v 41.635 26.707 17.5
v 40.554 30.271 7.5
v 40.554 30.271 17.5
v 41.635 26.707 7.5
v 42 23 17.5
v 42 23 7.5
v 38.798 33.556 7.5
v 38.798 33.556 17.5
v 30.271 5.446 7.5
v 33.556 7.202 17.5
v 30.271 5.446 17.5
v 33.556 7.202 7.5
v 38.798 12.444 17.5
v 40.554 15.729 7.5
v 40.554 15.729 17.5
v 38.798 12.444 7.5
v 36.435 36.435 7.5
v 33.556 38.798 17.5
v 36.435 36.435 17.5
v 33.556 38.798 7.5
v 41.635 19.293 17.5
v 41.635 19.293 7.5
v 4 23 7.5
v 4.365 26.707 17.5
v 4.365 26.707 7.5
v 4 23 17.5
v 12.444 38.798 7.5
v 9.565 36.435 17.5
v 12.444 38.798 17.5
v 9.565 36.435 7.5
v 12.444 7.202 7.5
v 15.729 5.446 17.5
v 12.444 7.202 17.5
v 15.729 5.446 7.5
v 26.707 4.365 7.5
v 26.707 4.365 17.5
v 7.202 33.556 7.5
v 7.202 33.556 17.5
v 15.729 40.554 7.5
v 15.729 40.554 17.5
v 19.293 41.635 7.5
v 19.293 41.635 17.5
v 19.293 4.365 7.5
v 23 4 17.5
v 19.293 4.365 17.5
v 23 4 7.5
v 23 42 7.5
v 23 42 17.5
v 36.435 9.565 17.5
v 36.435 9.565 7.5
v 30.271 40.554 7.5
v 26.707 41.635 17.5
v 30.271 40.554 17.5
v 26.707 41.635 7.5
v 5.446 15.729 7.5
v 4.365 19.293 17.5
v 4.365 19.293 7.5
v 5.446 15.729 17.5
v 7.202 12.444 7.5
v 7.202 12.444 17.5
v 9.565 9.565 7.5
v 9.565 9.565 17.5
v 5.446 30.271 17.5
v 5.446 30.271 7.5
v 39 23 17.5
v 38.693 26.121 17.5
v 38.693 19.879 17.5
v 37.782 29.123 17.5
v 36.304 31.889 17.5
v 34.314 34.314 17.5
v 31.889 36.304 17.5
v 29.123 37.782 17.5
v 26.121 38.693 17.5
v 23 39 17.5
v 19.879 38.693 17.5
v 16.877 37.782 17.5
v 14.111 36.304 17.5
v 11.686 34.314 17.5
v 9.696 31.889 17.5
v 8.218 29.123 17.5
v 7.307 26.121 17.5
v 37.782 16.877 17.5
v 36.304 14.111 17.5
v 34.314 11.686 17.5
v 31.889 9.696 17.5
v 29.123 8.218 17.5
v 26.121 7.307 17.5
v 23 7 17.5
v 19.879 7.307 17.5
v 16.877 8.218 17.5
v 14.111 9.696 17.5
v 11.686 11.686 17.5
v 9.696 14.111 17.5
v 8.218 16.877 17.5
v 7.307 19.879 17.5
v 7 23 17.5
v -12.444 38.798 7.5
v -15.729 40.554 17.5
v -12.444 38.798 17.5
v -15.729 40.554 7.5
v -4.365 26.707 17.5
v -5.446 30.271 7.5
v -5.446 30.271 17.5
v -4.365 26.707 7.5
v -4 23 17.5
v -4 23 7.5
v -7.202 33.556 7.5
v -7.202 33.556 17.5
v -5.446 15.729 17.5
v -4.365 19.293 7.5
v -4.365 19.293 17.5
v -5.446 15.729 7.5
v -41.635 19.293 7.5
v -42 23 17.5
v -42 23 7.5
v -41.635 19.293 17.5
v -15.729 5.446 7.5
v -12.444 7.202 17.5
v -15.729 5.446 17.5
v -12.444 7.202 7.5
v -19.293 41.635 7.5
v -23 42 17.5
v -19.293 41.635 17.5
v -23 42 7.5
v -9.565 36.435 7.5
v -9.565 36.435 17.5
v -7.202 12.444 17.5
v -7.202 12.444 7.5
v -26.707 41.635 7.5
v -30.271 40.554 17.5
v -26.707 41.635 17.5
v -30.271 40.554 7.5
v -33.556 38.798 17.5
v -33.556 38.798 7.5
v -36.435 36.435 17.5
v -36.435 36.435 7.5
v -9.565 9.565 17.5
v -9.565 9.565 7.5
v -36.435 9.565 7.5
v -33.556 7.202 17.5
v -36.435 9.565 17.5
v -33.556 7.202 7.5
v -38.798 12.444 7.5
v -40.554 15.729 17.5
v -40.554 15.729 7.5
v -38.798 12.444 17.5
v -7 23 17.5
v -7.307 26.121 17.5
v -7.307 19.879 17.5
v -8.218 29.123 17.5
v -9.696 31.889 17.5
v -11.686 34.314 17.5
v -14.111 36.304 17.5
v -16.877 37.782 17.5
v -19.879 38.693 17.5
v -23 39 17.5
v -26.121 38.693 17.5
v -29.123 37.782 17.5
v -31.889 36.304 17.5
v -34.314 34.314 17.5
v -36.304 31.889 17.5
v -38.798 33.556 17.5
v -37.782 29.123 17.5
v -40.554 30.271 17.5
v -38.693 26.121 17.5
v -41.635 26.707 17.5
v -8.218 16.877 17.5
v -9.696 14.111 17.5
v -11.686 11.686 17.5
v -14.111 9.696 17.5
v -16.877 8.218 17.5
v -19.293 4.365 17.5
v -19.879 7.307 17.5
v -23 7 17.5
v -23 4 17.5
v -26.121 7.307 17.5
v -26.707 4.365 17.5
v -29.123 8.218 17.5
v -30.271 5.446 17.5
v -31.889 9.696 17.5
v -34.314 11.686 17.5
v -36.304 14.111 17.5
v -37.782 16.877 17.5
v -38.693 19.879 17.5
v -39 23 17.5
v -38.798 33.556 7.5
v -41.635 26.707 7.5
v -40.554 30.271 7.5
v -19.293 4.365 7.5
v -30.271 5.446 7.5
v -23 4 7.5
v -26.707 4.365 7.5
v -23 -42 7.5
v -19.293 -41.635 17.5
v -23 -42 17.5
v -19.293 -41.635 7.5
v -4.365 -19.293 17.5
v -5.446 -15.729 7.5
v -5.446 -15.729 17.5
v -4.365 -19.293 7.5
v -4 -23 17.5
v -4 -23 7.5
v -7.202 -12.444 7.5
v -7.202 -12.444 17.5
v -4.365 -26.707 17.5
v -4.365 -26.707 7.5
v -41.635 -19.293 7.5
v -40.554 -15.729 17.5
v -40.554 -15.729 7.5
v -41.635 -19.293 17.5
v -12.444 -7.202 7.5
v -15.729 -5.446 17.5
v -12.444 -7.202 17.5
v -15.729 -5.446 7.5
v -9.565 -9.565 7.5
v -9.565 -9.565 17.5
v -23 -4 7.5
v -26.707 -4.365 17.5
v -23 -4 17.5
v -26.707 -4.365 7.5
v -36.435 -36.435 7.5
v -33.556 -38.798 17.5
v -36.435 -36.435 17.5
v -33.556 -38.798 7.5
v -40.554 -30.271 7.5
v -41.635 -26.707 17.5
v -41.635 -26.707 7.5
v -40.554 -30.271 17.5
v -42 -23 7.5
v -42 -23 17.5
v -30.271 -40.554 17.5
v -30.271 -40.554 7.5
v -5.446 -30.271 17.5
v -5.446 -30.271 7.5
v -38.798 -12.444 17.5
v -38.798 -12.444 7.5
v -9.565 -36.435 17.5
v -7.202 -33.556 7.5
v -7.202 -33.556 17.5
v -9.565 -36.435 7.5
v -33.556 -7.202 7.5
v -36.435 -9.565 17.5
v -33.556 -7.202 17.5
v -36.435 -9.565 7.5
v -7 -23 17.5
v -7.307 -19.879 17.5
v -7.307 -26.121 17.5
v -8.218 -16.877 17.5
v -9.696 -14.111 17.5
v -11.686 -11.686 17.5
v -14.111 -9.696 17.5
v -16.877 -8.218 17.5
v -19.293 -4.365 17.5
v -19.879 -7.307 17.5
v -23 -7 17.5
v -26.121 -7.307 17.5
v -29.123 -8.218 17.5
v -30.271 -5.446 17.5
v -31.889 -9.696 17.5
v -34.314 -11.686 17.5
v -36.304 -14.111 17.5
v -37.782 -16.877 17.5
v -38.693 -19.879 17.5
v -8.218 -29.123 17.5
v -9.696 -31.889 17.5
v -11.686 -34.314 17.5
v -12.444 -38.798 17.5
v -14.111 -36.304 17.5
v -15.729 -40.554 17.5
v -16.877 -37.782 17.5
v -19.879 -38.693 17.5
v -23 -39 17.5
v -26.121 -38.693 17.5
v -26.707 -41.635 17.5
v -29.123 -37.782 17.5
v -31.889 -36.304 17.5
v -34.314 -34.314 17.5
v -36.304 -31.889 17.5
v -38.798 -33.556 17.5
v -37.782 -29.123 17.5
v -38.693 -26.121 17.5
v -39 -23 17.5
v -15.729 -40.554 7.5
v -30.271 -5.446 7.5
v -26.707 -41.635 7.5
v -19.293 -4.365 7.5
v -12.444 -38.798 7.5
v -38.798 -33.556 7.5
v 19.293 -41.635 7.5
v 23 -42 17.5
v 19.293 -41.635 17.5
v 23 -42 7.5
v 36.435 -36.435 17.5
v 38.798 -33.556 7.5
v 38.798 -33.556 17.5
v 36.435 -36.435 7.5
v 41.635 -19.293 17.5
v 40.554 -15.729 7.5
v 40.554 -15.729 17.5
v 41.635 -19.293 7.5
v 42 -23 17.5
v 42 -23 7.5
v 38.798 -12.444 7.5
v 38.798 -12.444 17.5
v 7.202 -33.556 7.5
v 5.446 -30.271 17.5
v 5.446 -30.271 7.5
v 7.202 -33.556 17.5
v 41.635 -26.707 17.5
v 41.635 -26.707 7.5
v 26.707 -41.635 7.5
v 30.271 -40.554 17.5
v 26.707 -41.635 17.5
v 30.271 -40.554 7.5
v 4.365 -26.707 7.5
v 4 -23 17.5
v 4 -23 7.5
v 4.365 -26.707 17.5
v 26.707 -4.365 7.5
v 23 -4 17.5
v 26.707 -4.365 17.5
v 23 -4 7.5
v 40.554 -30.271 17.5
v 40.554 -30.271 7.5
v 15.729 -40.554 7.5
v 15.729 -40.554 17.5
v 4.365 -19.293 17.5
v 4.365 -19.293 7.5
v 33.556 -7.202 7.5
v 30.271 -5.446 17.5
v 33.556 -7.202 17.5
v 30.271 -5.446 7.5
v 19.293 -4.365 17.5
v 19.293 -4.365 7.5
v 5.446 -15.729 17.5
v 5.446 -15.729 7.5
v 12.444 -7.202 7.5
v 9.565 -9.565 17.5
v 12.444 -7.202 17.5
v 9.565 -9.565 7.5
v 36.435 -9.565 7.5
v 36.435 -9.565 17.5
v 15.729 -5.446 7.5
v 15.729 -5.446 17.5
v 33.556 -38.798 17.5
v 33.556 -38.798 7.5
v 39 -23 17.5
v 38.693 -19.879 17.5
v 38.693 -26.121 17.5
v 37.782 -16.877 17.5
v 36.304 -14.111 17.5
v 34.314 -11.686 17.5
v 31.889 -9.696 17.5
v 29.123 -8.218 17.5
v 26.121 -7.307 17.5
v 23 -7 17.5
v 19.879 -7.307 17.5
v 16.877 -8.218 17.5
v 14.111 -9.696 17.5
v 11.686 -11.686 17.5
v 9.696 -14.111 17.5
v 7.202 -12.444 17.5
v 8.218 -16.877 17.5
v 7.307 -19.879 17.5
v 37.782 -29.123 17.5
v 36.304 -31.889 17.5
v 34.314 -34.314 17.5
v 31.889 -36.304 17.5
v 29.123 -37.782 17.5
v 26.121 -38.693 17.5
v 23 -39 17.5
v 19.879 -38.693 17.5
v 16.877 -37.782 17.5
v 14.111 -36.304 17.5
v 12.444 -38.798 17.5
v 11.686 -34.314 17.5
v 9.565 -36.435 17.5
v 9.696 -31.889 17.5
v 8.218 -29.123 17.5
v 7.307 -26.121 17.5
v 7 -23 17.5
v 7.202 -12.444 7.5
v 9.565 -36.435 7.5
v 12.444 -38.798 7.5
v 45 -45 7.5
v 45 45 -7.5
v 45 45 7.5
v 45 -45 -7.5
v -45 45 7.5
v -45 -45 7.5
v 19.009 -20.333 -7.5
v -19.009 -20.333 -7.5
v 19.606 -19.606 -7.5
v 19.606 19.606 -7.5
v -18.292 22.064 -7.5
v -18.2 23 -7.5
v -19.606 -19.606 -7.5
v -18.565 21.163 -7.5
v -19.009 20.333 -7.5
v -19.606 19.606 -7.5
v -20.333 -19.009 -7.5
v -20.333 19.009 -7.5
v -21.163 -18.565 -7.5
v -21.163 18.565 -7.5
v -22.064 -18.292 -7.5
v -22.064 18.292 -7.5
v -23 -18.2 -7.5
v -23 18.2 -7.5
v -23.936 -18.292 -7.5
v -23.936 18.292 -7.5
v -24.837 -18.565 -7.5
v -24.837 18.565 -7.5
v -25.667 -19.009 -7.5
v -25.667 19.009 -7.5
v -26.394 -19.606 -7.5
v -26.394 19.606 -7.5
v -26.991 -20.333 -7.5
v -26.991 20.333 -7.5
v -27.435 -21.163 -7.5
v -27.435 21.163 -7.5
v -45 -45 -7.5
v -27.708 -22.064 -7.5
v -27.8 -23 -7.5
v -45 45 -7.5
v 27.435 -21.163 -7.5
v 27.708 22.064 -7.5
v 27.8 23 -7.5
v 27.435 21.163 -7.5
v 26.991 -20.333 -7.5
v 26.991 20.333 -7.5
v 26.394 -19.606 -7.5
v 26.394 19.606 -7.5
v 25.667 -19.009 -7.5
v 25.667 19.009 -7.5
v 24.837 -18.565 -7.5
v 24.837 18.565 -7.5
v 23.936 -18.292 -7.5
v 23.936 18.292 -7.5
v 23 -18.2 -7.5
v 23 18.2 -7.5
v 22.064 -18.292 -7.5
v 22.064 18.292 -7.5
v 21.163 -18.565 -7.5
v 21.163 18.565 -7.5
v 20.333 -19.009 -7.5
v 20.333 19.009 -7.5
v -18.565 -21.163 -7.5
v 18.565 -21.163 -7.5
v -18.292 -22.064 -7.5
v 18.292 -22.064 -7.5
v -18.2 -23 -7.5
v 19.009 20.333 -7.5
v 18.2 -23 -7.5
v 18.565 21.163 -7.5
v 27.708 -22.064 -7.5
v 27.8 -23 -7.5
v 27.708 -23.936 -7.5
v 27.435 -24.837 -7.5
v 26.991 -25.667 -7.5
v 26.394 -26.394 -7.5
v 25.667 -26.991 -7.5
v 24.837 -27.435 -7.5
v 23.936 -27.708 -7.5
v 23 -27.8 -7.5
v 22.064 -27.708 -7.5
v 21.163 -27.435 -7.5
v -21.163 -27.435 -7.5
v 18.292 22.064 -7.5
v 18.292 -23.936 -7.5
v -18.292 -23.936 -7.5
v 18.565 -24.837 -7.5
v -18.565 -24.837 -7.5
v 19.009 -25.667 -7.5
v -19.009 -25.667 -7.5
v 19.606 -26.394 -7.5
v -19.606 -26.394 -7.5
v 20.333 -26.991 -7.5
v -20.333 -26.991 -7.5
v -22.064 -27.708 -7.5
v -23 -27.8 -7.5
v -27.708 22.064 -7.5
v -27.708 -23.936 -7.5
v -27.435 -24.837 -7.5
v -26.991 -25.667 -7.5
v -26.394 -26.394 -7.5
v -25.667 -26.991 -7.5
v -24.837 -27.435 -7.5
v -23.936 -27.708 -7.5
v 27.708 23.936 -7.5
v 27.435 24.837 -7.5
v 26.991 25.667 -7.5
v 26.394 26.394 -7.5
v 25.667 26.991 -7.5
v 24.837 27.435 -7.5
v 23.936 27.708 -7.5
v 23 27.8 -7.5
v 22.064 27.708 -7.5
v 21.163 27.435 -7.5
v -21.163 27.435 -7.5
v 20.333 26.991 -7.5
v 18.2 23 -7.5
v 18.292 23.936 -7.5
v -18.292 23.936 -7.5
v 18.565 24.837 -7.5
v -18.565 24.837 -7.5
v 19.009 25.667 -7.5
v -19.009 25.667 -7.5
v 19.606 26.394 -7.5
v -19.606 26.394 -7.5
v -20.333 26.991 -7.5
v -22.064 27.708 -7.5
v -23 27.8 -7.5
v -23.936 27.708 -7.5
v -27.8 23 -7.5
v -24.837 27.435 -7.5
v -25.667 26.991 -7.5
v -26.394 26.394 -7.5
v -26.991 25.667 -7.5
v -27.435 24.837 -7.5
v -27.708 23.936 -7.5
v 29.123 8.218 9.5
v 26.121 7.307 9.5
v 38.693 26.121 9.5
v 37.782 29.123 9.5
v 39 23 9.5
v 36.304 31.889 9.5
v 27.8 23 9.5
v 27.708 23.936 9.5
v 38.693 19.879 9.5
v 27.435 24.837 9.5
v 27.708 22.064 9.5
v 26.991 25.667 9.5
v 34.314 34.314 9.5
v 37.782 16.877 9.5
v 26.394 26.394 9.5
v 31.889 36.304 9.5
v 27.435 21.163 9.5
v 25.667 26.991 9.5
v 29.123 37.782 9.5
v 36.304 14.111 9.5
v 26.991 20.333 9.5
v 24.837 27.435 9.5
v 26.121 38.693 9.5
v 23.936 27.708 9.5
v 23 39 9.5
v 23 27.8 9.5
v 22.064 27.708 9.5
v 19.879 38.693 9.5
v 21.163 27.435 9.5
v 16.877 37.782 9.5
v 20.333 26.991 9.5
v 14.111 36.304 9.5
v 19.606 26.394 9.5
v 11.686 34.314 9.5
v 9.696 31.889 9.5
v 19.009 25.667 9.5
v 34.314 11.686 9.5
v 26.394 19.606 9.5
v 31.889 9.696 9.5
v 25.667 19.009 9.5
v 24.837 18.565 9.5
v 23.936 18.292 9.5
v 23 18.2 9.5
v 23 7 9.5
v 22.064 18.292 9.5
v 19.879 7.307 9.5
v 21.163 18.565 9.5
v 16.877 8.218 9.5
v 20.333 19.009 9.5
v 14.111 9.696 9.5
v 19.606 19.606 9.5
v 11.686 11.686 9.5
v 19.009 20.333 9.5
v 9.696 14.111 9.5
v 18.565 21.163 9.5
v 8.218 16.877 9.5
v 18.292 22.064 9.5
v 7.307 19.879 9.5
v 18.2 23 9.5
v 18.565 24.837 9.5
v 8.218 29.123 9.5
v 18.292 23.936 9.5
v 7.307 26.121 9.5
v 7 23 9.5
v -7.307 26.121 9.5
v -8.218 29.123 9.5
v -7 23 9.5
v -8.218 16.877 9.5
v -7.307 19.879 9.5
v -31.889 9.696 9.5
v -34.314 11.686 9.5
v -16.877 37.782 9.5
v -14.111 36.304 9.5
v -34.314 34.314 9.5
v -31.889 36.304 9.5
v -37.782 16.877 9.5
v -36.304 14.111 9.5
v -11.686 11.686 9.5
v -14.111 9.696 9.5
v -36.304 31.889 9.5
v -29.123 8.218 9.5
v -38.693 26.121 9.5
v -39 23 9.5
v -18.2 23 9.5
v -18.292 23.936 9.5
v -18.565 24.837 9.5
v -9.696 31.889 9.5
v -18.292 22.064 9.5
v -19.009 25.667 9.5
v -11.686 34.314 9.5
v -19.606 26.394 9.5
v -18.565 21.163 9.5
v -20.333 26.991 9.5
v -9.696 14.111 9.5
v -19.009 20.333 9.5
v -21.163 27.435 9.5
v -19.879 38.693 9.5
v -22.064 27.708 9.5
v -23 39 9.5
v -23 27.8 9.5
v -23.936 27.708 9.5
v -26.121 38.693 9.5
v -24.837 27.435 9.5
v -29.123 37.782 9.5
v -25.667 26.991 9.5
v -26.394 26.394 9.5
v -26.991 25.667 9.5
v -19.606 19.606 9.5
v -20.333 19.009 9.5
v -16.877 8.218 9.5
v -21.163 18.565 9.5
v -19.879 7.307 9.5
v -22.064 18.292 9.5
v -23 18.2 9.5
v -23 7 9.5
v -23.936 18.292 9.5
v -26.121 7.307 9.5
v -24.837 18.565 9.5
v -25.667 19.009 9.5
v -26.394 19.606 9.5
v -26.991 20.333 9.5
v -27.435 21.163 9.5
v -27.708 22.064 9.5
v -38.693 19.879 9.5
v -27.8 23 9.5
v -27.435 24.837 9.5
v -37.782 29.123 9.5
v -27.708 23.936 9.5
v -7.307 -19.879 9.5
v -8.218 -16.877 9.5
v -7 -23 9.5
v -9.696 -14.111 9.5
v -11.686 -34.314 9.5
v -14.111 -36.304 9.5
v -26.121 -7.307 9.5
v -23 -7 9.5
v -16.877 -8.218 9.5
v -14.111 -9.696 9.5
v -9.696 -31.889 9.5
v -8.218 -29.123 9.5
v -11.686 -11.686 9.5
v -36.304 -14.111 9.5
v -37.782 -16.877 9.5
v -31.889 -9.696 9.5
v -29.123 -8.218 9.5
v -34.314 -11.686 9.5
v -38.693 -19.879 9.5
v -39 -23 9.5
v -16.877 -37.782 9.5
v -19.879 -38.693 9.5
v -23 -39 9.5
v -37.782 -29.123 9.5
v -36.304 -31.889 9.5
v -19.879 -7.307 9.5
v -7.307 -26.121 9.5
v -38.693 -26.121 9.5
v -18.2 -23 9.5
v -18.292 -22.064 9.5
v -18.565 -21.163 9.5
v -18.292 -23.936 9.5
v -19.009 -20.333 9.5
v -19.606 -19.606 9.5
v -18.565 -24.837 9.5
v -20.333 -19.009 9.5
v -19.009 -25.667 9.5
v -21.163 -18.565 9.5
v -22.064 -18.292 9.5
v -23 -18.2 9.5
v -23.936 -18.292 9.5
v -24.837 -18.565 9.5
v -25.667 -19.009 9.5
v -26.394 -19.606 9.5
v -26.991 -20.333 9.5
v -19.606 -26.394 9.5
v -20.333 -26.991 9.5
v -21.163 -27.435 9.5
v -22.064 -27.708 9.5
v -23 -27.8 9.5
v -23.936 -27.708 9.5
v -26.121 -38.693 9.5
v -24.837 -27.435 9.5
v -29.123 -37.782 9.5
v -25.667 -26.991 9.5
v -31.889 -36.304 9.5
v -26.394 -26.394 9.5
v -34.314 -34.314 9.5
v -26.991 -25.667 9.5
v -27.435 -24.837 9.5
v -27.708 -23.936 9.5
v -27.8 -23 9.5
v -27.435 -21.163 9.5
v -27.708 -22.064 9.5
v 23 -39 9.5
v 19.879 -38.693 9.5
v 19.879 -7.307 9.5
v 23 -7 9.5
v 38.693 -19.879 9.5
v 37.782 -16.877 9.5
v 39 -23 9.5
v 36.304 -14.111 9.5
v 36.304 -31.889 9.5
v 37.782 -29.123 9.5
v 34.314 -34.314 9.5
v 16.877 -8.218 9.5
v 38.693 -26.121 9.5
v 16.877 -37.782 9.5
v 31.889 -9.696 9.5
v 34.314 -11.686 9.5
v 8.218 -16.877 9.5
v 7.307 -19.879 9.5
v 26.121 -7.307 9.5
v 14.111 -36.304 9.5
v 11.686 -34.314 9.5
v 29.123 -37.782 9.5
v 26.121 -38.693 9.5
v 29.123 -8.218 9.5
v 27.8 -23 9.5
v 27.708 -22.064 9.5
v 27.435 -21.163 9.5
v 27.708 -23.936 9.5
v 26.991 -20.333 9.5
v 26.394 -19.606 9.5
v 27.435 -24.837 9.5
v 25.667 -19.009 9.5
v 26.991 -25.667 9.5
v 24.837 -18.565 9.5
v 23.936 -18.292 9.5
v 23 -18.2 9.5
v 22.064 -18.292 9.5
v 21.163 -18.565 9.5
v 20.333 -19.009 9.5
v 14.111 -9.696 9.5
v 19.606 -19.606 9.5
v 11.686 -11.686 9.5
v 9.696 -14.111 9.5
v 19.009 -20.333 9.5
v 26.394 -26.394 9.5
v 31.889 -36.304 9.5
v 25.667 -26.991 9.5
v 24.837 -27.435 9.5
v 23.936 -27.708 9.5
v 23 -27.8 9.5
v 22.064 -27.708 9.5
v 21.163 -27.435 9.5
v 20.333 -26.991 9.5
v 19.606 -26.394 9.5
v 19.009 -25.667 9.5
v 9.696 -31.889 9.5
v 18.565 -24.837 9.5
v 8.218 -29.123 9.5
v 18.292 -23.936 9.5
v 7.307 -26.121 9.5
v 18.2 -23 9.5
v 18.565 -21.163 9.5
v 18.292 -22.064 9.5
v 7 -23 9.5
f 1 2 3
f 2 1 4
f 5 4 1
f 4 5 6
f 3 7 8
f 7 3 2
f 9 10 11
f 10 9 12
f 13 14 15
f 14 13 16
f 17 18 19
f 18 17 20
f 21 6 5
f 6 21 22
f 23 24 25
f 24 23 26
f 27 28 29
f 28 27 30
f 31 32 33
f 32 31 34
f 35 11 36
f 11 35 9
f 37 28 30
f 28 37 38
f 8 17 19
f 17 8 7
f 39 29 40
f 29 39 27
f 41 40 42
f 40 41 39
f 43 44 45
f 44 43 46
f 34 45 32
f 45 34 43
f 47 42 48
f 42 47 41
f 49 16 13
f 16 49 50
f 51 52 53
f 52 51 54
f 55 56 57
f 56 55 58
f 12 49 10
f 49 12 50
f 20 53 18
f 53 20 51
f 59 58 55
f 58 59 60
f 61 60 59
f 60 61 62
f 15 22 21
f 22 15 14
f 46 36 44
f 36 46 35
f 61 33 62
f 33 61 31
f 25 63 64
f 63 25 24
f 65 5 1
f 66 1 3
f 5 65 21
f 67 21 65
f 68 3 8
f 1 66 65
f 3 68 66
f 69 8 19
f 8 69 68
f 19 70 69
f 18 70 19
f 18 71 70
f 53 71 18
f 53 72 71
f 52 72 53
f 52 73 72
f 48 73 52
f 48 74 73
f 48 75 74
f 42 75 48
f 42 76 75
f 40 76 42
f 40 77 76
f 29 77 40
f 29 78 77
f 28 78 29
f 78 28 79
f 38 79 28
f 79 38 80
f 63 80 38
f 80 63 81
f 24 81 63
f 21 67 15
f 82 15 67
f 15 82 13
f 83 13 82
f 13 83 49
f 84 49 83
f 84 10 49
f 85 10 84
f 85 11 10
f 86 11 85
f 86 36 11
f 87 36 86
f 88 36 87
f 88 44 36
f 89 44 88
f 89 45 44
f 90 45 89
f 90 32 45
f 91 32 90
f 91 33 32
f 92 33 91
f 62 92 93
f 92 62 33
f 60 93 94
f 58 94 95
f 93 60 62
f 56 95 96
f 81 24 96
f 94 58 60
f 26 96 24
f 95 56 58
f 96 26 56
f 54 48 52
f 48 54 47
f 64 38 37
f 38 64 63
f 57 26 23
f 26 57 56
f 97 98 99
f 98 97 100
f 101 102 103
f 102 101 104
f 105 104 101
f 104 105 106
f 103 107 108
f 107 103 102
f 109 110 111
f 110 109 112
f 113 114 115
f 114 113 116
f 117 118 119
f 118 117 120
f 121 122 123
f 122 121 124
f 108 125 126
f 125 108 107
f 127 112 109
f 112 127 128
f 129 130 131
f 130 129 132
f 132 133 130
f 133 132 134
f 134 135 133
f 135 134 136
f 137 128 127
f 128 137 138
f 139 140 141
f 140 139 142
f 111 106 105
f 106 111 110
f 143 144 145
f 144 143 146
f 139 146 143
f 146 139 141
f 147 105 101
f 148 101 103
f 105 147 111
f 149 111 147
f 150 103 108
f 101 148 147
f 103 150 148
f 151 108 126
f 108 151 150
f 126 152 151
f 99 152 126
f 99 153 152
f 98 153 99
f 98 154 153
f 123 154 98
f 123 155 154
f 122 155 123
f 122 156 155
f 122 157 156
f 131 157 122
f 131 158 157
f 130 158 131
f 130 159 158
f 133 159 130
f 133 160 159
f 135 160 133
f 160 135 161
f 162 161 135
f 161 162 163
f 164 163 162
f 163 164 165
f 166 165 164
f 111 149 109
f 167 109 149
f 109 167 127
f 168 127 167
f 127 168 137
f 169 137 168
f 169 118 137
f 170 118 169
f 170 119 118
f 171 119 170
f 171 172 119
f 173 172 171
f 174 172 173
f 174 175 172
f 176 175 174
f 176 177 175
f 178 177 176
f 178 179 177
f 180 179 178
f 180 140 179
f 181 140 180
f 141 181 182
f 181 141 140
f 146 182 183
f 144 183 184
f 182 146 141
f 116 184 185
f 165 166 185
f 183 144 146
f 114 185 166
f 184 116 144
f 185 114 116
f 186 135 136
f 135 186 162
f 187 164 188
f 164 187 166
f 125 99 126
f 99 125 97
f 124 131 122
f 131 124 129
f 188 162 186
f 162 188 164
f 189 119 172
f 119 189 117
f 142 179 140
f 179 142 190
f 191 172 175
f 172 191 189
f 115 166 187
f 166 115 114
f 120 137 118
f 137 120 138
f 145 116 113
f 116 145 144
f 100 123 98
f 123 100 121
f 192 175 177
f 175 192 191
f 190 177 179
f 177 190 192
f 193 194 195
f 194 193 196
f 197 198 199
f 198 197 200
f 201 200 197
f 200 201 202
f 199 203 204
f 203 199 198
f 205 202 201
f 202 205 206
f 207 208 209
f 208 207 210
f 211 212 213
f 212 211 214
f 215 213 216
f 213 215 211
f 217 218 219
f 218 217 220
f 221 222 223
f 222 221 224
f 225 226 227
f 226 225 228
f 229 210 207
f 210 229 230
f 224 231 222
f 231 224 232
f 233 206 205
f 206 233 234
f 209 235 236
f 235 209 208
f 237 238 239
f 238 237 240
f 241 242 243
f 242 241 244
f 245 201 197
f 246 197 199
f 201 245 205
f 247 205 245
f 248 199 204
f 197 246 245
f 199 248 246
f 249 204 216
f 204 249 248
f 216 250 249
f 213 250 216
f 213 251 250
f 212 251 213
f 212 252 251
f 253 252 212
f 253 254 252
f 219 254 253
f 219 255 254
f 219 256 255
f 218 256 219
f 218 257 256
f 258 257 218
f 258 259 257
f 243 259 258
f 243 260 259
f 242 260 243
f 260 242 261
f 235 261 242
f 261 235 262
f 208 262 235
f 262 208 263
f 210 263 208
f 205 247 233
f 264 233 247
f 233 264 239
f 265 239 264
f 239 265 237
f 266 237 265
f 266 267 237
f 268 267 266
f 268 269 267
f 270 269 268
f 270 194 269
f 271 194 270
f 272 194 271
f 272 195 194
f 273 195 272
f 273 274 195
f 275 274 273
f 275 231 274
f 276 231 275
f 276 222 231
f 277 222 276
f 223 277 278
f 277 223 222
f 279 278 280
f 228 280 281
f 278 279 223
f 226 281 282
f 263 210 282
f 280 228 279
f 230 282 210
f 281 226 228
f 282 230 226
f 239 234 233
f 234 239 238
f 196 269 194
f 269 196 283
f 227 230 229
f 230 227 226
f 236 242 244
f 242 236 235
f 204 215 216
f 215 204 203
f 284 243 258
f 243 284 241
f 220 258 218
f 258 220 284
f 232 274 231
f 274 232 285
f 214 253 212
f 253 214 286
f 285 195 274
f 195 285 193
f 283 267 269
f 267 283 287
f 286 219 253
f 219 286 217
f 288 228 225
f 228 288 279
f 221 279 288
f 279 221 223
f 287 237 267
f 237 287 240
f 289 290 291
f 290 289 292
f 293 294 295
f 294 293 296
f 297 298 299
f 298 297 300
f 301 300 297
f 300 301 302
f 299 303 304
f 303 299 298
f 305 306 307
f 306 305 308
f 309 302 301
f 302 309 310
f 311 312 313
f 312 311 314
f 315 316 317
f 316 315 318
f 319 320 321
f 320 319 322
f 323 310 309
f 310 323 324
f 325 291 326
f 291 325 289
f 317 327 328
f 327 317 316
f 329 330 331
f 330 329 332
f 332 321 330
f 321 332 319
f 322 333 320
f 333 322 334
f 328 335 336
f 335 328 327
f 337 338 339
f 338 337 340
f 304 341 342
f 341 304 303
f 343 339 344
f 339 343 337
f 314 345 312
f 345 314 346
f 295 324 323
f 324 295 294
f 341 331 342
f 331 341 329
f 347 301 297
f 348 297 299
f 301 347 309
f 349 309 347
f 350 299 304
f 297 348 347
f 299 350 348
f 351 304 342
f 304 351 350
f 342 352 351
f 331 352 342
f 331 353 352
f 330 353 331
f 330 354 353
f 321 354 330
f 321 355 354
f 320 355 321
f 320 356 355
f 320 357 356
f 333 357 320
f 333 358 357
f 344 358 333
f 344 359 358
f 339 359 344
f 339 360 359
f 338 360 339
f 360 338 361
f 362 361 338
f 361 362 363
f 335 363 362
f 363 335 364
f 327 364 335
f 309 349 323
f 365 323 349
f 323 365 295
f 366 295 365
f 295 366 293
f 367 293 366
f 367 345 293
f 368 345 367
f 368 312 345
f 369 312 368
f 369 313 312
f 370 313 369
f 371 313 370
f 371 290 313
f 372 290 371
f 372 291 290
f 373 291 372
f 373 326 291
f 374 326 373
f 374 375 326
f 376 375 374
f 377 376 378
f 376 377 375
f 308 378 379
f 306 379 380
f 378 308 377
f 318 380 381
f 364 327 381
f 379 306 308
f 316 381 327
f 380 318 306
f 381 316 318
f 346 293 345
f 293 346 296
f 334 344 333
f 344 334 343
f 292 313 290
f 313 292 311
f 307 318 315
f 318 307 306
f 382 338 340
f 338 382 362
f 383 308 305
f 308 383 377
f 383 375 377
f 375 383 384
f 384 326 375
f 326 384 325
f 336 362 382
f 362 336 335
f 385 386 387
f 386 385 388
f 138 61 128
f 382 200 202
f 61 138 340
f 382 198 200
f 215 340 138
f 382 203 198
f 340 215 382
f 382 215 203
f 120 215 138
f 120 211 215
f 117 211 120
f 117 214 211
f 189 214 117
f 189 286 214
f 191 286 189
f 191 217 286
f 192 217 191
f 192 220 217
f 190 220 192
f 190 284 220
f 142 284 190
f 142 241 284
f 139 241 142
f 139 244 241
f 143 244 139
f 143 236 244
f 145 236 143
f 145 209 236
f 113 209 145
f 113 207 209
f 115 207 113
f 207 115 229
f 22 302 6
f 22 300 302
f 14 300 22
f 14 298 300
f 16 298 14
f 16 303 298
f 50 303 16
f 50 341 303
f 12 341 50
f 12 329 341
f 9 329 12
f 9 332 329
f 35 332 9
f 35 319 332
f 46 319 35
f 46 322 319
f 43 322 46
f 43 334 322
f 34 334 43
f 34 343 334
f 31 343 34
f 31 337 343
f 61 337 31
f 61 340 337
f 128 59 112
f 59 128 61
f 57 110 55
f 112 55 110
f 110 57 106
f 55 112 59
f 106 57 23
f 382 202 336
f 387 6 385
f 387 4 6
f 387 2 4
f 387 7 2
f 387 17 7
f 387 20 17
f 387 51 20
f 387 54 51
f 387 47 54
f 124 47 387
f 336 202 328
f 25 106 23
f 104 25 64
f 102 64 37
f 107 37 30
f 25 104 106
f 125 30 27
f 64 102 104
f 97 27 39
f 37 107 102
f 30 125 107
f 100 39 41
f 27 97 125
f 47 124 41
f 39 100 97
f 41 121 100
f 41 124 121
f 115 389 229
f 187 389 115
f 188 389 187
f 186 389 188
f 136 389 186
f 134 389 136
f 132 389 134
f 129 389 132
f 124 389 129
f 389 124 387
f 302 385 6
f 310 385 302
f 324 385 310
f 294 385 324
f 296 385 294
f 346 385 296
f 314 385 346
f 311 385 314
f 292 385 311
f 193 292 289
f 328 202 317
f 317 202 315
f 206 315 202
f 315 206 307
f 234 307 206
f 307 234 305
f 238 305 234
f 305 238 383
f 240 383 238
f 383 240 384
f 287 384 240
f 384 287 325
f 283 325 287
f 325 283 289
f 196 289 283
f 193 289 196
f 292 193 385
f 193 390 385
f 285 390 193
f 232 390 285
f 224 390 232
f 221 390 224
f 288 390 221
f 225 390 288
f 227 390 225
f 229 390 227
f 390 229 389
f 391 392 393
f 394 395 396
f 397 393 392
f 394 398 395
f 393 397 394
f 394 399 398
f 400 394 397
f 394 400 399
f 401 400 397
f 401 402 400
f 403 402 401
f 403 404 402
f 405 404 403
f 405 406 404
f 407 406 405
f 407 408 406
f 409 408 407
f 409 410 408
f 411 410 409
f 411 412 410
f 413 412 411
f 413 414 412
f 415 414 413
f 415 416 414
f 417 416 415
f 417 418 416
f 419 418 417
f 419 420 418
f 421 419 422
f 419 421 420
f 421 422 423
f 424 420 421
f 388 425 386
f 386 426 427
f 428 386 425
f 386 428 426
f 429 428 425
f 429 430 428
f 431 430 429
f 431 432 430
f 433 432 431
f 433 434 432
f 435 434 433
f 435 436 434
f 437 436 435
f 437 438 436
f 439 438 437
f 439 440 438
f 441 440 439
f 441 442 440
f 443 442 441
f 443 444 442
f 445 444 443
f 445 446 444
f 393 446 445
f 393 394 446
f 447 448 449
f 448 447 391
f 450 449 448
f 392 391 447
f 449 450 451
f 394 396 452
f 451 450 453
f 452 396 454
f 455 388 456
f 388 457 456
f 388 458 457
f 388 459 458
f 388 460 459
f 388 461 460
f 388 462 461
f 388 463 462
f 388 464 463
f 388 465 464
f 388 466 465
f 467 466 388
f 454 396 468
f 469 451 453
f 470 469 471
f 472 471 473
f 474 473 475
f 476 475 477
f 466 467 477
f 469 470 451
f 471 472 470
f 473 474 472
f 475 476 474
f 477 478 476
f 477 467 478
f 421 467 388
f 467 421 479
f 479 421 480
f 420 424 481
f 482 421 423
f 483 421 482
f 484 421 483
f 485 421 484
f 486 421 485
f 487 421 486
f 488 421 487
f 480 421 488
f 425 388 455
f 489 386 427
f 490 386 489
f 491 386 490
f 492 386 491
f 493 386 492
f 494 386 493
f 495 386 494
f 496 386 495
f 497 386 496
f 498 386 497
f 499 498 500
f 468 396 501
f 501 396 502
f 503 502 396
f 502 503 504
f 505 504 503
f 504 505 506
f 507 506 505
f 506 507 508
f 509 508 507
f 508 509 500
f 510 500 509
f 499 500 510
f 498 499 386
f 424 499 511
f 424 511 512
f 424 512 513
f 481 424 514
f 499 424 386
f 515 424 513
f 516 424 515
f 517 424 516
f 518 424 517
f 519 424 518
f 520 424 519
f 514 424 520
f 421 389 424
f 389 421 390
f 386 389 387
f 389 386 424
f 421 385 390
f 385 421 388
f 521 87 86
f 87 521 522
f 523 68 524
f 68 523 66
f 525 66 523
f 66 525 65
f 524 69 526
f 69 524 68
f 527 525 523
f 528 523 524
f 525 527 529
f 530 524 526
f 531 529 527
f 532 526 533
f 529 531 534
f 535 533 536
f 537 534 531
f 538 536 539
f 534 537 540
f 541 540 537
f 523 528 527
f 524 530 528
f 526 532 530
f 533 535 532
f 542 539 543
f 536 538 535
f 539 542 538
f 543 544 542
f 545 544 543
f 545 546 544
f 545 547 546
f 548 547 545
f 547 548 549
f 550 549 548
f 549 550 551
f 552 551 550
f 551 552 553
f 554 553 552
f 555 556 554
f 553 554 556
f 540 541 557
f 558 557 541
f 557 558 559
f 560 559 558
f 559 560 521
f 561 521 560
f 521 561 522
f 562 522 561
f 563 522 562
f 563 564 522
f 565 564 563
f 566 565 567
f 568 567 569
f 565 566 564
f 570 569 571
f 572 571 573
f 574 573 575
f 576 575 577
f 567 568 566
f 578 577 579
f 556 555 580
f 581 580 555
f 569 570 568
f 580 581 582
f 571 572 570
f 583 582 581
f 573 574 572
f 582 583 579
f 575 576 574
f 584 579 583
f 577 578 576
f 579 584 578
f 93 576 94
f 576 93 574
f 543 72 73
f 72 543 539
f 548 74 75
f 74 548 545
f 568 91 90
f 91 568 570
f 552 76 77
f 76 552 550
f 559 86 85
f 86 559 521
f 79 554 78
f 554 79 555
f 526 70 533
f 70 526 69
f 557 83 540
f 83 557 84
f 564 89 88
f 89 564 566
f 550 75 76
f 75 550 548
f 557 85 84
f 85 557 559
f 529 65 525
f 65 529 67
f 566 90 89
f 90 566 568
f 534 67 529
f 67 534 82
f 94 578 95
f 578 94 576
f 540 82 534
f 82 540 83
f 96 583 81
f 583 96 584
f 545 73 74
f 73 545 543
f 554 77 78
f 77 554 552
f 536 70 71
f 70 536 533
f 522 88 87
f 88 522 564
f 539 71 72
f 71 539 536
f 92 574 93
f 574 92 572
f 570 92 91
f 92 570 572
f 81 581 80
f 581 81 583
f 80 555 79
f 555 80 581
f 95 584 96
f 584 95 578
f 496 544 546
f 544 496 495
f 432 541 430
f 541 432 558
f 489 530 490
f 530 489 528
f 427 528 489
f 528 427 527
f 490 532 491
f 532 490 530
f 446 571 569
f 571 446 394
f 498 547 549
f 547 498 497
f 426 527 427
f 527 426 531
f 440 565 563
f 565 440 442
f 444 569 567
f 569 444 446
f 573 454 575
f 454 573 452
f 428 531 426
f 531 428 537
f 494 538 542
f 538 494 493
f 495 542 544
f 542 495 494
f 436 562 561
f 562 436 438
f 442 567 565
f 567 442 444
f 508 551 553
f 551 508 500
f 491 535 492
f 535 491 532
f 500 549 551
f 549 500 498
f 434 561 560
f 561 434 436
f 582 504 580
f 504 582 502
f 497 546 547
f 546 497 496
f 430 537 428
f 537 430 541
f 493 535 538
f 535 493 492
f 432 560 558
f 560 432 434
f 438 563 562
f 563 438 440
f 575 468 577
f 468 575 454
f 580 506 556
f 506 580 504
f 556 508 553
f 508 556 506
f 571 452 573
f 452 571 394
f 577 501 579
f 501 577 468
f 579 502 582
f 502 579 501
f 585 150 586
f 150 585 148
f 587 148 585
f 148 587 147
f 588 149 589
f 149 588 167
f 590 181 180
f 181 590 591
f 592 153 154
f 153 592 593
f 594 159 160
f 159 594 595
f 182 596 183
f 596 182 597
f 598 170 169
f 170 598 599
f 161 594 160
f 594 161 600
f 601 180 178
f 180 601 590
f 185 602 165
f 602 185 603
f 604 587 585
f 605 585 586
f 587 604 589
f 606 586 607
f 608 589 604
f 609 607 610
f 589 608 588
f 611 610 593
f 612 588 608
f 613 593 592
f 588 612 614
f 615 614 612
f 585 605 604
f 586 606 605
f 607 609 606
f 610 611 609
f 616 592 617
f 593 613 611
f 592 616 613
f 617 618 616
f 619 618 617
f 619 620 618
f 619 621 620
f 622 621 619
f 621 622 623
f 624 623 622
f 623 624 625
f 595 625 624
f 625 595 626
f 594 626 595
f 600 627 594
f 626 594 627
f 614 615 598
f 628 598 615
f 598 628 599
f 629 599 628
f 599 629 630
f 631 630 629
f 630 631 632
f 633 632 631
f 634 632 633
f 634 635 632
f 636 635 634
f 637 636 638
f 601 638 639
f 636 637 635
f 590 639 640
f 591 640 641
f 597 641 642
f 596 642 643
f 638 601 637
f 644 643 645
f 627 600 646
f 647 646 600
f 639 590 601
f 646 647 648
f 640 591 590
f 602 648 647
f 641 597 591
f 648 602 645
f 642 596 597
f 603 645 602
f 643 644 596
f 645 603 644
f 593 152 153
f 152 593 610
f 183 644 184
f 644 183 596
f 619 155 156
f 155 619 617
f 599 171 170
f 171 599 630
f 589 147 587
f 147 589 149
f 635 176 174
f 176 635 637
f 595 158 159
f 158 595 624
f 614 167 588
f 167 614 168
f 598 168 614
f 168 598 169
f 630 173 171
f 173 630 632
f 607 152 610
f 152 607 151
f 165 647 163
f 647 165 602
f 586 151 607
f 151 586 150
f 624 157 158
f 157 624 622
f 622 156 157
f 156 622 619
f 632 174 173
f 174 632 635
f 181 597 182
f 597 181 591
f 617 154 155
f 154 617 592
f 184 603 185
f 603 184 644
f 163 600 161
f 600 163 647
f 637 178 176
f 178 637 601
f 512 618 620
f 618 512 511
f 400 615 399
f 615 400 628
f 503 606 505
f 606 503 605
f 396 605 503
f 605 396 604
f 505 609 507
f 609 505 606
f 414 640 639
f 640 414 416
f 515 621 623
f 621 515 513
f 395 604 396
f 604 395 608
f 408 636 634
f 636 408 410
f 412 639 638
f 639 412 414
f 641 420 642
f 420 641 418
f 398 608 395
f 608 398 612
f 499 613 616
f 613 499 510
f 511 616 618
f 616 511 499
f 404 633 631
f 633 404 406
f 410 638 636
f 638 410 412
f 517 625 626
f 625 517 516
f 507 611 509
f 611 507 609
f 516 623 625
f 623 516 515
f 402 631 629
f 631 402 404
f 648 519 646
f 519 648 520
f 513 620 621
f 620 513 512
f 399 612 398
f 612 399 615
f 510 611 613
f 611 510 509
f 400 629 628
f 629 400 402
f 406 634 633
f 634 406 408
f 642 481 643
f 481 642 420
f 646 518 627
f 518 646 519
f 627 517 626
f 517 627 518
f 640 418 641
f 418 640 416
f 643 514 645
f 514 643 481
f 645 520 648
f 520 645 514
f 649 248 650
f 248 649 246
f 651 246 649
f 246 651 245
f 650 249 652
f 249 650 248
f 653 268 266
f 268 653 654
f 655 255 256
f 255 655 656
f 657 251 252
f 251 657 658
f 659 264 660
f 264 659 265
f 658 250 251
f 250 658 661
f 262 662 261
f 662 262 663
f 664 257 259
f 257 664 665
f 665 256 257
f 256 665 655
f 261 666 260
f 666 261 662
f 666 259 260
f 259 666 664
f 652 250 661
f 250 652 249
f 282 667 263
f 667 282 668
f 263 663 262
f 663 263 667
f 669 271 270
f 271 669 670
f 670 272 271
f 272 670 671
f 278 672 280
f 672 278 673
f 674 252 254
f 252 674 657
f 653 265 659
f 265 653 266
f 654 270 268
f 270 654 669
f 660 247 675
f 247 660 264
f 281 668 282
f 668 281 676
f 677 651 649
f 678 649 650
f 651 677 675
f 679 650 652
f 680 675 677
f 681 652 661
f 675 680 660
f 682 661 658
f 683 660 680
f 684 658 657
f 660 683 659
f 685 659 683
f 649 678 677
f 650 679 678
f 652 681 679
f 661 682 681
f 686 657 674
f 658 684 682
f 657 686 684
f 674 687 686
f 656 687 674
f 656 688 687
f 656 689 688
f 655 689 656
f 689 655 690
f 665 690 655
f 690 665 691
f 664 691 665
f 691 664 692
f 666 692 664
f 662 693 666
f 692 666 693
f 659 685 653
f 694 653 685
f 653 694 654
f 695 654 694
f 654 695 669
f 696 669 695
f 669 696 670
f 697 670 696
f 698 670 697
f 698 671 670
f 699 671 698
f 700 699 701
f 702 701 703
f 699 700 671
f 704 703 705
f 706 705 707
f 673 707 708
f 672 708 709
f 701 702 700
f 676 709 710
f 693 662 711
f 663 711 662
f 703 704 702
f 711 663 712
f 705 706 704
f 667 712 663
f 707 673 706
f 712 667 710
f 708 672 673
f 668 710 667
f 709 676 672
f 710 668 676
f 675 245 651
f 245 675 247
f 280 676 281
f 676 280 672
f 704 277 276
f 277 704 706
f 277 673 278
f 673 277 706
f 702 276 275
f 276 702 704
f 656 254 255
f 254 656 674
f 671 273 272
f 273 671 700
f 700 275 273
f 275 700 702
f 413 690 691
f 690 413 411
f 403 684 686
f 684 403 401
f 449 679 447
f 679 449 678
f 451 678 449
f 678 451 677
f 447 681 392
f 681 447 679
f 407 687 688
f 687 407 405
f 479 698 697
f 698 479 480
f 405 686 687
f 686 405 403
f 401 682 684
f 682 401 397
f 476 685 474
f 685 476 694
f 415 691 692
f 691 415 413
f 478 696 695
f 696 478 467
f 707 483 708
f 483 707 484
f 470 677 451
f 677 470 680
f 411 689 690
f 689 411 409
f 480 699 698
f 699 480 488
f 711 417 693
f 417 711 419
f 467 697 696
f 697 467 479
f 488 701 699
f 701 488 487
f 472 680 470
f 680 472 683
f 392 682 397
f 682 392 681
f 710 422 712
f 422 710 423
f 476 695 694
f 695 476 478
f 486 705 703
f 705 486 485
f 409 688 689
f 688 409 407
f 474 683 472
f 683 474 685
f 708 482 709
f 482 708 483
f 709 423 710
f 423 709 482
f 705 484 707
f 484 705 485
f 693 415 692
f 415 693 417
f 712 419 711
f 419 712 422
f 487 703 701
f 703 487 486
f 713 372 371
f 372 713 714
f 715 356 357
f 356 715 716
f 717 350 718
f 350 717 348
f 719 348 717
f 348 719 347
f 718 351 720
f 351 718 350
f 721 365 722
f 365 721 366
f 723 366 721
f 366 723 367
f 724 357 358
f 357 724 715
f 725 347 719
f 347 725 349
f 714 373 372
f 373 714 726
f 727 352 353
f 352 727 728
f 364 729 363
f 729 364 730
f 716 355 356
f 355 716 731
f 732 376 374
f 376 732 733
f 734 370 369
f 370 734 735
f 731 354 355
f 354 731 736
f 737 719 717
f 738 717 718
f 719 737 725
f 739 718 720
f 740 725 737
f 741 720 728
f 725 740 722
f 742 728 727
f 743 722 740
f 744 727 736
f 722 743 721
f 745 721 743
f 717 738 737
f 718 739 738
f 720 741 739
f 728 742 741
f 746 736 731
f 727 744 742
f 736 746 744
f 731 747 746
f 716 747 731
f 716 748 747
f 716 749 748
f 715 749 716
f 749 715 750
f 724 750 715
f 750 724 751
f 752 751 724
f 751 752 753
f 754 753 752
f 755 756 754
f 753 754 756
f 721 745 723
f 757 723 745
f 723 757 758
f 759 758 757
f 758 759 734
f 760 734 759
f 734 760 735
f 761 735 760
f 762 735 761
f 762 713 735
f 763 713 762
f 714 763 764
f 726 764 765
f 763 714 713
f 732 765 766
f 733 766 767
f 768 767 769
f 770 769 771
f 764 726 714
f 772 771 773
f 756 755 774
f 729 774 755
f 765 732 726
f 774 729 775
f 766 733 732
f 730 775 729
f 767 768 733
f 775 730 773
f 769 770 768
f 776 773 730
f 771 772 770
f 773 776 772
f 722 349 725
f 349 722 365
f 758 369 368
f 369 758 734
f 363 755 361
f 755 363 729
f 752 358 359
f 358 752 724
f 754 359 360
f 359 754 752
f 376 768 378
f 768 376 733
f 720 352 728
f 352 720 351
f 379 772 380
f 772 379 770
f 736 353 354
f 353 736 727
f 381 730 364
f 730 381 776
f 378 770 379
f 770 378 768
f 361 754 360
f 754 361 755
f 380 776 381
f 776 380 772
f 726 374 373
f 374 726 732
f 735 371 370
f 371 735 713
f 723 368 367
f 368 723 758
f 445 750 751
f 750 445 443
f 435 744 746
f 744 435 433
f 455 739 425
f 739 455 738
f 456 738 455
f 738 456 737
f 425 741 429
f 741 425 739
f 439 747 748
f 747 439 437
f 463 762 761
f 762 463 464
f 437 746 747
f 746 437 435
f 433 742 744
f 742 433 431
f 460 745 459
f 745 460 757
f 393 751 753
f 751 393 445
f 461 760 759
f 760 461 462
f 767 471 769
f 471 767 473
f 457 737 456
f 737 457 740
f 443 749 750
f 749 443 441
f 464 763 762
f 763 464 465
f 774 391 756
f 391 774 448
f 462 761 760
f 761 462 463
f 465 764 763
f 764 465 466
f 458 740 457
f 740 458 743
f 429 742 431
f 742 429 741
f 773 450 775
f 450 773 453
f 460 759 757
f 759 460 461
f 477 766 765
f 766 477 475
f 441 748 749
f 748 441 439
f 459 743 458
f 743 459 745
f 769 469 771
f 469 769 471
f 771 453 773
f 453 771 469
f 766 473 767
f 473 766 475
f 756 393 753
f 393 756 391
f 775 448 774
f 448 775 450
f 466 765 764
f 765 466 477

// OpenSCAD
$fn = 32;

// ----------------------------------------------------------------------
// Socket pad plate
// bosses with counterbored sockets for the screws
// ----------------------------------------------------------------------

// --- parameters (mm) ---
base_t = 15;           // base plate thickness
boss_h = 10;           // boss height above the base plate
boss_d = 38;           // boss diameter
socket_d = 32;         // socket diameter
socket_depth = 8;      // socket depth from the boss face
bolt_d = 9.6;          // screw clearance hole through the socket floor
plate = [90, 90, 15];  // overall size (x, y, z)
edge = 22;             // boss centre offset from the plate edge
pads = 4;              // boss count, one per corner

// --- derived feature positions (mm) ---
height = base_t + boss_h;        // = 25   overall height of the part
corner_x = plate[0] / 2 - edge;  // = 23   boss centre X
corner_y = plate[1] / 2 - edge;  // = 23   boss centre Y
feature_centers = [
  [corner_x, corner_y],
  [-corner_x, corner_y],
  [-corner_x, -corner_y],
  [corner_x, -corner_y]
];   // boss centres: sockets, holes and the pads themselves are placed from here

// base plate, bosses on feature_centers, socket + through hole in each
difference() {
  union() {
    cube(plate, center = true);
    for (centre = feature_centers)
      translate([centre[0], centre[1], plate[2] / 2 - 1])
        cylinder(d = boss_d, h = boss_h + 1);
  }
  for (centre = feature_centers) {
    translate([centre[0], centre[1], plate[2] / 2 + boss_h - socket_depth])
      cylinder(d = socket_d, h = socket_depth + 1);
    translate([centre[0], centre[1], -height])
      cylinder(d = bolt_d, h = 2 * height + 2);  // through the socket floor
  }
}
